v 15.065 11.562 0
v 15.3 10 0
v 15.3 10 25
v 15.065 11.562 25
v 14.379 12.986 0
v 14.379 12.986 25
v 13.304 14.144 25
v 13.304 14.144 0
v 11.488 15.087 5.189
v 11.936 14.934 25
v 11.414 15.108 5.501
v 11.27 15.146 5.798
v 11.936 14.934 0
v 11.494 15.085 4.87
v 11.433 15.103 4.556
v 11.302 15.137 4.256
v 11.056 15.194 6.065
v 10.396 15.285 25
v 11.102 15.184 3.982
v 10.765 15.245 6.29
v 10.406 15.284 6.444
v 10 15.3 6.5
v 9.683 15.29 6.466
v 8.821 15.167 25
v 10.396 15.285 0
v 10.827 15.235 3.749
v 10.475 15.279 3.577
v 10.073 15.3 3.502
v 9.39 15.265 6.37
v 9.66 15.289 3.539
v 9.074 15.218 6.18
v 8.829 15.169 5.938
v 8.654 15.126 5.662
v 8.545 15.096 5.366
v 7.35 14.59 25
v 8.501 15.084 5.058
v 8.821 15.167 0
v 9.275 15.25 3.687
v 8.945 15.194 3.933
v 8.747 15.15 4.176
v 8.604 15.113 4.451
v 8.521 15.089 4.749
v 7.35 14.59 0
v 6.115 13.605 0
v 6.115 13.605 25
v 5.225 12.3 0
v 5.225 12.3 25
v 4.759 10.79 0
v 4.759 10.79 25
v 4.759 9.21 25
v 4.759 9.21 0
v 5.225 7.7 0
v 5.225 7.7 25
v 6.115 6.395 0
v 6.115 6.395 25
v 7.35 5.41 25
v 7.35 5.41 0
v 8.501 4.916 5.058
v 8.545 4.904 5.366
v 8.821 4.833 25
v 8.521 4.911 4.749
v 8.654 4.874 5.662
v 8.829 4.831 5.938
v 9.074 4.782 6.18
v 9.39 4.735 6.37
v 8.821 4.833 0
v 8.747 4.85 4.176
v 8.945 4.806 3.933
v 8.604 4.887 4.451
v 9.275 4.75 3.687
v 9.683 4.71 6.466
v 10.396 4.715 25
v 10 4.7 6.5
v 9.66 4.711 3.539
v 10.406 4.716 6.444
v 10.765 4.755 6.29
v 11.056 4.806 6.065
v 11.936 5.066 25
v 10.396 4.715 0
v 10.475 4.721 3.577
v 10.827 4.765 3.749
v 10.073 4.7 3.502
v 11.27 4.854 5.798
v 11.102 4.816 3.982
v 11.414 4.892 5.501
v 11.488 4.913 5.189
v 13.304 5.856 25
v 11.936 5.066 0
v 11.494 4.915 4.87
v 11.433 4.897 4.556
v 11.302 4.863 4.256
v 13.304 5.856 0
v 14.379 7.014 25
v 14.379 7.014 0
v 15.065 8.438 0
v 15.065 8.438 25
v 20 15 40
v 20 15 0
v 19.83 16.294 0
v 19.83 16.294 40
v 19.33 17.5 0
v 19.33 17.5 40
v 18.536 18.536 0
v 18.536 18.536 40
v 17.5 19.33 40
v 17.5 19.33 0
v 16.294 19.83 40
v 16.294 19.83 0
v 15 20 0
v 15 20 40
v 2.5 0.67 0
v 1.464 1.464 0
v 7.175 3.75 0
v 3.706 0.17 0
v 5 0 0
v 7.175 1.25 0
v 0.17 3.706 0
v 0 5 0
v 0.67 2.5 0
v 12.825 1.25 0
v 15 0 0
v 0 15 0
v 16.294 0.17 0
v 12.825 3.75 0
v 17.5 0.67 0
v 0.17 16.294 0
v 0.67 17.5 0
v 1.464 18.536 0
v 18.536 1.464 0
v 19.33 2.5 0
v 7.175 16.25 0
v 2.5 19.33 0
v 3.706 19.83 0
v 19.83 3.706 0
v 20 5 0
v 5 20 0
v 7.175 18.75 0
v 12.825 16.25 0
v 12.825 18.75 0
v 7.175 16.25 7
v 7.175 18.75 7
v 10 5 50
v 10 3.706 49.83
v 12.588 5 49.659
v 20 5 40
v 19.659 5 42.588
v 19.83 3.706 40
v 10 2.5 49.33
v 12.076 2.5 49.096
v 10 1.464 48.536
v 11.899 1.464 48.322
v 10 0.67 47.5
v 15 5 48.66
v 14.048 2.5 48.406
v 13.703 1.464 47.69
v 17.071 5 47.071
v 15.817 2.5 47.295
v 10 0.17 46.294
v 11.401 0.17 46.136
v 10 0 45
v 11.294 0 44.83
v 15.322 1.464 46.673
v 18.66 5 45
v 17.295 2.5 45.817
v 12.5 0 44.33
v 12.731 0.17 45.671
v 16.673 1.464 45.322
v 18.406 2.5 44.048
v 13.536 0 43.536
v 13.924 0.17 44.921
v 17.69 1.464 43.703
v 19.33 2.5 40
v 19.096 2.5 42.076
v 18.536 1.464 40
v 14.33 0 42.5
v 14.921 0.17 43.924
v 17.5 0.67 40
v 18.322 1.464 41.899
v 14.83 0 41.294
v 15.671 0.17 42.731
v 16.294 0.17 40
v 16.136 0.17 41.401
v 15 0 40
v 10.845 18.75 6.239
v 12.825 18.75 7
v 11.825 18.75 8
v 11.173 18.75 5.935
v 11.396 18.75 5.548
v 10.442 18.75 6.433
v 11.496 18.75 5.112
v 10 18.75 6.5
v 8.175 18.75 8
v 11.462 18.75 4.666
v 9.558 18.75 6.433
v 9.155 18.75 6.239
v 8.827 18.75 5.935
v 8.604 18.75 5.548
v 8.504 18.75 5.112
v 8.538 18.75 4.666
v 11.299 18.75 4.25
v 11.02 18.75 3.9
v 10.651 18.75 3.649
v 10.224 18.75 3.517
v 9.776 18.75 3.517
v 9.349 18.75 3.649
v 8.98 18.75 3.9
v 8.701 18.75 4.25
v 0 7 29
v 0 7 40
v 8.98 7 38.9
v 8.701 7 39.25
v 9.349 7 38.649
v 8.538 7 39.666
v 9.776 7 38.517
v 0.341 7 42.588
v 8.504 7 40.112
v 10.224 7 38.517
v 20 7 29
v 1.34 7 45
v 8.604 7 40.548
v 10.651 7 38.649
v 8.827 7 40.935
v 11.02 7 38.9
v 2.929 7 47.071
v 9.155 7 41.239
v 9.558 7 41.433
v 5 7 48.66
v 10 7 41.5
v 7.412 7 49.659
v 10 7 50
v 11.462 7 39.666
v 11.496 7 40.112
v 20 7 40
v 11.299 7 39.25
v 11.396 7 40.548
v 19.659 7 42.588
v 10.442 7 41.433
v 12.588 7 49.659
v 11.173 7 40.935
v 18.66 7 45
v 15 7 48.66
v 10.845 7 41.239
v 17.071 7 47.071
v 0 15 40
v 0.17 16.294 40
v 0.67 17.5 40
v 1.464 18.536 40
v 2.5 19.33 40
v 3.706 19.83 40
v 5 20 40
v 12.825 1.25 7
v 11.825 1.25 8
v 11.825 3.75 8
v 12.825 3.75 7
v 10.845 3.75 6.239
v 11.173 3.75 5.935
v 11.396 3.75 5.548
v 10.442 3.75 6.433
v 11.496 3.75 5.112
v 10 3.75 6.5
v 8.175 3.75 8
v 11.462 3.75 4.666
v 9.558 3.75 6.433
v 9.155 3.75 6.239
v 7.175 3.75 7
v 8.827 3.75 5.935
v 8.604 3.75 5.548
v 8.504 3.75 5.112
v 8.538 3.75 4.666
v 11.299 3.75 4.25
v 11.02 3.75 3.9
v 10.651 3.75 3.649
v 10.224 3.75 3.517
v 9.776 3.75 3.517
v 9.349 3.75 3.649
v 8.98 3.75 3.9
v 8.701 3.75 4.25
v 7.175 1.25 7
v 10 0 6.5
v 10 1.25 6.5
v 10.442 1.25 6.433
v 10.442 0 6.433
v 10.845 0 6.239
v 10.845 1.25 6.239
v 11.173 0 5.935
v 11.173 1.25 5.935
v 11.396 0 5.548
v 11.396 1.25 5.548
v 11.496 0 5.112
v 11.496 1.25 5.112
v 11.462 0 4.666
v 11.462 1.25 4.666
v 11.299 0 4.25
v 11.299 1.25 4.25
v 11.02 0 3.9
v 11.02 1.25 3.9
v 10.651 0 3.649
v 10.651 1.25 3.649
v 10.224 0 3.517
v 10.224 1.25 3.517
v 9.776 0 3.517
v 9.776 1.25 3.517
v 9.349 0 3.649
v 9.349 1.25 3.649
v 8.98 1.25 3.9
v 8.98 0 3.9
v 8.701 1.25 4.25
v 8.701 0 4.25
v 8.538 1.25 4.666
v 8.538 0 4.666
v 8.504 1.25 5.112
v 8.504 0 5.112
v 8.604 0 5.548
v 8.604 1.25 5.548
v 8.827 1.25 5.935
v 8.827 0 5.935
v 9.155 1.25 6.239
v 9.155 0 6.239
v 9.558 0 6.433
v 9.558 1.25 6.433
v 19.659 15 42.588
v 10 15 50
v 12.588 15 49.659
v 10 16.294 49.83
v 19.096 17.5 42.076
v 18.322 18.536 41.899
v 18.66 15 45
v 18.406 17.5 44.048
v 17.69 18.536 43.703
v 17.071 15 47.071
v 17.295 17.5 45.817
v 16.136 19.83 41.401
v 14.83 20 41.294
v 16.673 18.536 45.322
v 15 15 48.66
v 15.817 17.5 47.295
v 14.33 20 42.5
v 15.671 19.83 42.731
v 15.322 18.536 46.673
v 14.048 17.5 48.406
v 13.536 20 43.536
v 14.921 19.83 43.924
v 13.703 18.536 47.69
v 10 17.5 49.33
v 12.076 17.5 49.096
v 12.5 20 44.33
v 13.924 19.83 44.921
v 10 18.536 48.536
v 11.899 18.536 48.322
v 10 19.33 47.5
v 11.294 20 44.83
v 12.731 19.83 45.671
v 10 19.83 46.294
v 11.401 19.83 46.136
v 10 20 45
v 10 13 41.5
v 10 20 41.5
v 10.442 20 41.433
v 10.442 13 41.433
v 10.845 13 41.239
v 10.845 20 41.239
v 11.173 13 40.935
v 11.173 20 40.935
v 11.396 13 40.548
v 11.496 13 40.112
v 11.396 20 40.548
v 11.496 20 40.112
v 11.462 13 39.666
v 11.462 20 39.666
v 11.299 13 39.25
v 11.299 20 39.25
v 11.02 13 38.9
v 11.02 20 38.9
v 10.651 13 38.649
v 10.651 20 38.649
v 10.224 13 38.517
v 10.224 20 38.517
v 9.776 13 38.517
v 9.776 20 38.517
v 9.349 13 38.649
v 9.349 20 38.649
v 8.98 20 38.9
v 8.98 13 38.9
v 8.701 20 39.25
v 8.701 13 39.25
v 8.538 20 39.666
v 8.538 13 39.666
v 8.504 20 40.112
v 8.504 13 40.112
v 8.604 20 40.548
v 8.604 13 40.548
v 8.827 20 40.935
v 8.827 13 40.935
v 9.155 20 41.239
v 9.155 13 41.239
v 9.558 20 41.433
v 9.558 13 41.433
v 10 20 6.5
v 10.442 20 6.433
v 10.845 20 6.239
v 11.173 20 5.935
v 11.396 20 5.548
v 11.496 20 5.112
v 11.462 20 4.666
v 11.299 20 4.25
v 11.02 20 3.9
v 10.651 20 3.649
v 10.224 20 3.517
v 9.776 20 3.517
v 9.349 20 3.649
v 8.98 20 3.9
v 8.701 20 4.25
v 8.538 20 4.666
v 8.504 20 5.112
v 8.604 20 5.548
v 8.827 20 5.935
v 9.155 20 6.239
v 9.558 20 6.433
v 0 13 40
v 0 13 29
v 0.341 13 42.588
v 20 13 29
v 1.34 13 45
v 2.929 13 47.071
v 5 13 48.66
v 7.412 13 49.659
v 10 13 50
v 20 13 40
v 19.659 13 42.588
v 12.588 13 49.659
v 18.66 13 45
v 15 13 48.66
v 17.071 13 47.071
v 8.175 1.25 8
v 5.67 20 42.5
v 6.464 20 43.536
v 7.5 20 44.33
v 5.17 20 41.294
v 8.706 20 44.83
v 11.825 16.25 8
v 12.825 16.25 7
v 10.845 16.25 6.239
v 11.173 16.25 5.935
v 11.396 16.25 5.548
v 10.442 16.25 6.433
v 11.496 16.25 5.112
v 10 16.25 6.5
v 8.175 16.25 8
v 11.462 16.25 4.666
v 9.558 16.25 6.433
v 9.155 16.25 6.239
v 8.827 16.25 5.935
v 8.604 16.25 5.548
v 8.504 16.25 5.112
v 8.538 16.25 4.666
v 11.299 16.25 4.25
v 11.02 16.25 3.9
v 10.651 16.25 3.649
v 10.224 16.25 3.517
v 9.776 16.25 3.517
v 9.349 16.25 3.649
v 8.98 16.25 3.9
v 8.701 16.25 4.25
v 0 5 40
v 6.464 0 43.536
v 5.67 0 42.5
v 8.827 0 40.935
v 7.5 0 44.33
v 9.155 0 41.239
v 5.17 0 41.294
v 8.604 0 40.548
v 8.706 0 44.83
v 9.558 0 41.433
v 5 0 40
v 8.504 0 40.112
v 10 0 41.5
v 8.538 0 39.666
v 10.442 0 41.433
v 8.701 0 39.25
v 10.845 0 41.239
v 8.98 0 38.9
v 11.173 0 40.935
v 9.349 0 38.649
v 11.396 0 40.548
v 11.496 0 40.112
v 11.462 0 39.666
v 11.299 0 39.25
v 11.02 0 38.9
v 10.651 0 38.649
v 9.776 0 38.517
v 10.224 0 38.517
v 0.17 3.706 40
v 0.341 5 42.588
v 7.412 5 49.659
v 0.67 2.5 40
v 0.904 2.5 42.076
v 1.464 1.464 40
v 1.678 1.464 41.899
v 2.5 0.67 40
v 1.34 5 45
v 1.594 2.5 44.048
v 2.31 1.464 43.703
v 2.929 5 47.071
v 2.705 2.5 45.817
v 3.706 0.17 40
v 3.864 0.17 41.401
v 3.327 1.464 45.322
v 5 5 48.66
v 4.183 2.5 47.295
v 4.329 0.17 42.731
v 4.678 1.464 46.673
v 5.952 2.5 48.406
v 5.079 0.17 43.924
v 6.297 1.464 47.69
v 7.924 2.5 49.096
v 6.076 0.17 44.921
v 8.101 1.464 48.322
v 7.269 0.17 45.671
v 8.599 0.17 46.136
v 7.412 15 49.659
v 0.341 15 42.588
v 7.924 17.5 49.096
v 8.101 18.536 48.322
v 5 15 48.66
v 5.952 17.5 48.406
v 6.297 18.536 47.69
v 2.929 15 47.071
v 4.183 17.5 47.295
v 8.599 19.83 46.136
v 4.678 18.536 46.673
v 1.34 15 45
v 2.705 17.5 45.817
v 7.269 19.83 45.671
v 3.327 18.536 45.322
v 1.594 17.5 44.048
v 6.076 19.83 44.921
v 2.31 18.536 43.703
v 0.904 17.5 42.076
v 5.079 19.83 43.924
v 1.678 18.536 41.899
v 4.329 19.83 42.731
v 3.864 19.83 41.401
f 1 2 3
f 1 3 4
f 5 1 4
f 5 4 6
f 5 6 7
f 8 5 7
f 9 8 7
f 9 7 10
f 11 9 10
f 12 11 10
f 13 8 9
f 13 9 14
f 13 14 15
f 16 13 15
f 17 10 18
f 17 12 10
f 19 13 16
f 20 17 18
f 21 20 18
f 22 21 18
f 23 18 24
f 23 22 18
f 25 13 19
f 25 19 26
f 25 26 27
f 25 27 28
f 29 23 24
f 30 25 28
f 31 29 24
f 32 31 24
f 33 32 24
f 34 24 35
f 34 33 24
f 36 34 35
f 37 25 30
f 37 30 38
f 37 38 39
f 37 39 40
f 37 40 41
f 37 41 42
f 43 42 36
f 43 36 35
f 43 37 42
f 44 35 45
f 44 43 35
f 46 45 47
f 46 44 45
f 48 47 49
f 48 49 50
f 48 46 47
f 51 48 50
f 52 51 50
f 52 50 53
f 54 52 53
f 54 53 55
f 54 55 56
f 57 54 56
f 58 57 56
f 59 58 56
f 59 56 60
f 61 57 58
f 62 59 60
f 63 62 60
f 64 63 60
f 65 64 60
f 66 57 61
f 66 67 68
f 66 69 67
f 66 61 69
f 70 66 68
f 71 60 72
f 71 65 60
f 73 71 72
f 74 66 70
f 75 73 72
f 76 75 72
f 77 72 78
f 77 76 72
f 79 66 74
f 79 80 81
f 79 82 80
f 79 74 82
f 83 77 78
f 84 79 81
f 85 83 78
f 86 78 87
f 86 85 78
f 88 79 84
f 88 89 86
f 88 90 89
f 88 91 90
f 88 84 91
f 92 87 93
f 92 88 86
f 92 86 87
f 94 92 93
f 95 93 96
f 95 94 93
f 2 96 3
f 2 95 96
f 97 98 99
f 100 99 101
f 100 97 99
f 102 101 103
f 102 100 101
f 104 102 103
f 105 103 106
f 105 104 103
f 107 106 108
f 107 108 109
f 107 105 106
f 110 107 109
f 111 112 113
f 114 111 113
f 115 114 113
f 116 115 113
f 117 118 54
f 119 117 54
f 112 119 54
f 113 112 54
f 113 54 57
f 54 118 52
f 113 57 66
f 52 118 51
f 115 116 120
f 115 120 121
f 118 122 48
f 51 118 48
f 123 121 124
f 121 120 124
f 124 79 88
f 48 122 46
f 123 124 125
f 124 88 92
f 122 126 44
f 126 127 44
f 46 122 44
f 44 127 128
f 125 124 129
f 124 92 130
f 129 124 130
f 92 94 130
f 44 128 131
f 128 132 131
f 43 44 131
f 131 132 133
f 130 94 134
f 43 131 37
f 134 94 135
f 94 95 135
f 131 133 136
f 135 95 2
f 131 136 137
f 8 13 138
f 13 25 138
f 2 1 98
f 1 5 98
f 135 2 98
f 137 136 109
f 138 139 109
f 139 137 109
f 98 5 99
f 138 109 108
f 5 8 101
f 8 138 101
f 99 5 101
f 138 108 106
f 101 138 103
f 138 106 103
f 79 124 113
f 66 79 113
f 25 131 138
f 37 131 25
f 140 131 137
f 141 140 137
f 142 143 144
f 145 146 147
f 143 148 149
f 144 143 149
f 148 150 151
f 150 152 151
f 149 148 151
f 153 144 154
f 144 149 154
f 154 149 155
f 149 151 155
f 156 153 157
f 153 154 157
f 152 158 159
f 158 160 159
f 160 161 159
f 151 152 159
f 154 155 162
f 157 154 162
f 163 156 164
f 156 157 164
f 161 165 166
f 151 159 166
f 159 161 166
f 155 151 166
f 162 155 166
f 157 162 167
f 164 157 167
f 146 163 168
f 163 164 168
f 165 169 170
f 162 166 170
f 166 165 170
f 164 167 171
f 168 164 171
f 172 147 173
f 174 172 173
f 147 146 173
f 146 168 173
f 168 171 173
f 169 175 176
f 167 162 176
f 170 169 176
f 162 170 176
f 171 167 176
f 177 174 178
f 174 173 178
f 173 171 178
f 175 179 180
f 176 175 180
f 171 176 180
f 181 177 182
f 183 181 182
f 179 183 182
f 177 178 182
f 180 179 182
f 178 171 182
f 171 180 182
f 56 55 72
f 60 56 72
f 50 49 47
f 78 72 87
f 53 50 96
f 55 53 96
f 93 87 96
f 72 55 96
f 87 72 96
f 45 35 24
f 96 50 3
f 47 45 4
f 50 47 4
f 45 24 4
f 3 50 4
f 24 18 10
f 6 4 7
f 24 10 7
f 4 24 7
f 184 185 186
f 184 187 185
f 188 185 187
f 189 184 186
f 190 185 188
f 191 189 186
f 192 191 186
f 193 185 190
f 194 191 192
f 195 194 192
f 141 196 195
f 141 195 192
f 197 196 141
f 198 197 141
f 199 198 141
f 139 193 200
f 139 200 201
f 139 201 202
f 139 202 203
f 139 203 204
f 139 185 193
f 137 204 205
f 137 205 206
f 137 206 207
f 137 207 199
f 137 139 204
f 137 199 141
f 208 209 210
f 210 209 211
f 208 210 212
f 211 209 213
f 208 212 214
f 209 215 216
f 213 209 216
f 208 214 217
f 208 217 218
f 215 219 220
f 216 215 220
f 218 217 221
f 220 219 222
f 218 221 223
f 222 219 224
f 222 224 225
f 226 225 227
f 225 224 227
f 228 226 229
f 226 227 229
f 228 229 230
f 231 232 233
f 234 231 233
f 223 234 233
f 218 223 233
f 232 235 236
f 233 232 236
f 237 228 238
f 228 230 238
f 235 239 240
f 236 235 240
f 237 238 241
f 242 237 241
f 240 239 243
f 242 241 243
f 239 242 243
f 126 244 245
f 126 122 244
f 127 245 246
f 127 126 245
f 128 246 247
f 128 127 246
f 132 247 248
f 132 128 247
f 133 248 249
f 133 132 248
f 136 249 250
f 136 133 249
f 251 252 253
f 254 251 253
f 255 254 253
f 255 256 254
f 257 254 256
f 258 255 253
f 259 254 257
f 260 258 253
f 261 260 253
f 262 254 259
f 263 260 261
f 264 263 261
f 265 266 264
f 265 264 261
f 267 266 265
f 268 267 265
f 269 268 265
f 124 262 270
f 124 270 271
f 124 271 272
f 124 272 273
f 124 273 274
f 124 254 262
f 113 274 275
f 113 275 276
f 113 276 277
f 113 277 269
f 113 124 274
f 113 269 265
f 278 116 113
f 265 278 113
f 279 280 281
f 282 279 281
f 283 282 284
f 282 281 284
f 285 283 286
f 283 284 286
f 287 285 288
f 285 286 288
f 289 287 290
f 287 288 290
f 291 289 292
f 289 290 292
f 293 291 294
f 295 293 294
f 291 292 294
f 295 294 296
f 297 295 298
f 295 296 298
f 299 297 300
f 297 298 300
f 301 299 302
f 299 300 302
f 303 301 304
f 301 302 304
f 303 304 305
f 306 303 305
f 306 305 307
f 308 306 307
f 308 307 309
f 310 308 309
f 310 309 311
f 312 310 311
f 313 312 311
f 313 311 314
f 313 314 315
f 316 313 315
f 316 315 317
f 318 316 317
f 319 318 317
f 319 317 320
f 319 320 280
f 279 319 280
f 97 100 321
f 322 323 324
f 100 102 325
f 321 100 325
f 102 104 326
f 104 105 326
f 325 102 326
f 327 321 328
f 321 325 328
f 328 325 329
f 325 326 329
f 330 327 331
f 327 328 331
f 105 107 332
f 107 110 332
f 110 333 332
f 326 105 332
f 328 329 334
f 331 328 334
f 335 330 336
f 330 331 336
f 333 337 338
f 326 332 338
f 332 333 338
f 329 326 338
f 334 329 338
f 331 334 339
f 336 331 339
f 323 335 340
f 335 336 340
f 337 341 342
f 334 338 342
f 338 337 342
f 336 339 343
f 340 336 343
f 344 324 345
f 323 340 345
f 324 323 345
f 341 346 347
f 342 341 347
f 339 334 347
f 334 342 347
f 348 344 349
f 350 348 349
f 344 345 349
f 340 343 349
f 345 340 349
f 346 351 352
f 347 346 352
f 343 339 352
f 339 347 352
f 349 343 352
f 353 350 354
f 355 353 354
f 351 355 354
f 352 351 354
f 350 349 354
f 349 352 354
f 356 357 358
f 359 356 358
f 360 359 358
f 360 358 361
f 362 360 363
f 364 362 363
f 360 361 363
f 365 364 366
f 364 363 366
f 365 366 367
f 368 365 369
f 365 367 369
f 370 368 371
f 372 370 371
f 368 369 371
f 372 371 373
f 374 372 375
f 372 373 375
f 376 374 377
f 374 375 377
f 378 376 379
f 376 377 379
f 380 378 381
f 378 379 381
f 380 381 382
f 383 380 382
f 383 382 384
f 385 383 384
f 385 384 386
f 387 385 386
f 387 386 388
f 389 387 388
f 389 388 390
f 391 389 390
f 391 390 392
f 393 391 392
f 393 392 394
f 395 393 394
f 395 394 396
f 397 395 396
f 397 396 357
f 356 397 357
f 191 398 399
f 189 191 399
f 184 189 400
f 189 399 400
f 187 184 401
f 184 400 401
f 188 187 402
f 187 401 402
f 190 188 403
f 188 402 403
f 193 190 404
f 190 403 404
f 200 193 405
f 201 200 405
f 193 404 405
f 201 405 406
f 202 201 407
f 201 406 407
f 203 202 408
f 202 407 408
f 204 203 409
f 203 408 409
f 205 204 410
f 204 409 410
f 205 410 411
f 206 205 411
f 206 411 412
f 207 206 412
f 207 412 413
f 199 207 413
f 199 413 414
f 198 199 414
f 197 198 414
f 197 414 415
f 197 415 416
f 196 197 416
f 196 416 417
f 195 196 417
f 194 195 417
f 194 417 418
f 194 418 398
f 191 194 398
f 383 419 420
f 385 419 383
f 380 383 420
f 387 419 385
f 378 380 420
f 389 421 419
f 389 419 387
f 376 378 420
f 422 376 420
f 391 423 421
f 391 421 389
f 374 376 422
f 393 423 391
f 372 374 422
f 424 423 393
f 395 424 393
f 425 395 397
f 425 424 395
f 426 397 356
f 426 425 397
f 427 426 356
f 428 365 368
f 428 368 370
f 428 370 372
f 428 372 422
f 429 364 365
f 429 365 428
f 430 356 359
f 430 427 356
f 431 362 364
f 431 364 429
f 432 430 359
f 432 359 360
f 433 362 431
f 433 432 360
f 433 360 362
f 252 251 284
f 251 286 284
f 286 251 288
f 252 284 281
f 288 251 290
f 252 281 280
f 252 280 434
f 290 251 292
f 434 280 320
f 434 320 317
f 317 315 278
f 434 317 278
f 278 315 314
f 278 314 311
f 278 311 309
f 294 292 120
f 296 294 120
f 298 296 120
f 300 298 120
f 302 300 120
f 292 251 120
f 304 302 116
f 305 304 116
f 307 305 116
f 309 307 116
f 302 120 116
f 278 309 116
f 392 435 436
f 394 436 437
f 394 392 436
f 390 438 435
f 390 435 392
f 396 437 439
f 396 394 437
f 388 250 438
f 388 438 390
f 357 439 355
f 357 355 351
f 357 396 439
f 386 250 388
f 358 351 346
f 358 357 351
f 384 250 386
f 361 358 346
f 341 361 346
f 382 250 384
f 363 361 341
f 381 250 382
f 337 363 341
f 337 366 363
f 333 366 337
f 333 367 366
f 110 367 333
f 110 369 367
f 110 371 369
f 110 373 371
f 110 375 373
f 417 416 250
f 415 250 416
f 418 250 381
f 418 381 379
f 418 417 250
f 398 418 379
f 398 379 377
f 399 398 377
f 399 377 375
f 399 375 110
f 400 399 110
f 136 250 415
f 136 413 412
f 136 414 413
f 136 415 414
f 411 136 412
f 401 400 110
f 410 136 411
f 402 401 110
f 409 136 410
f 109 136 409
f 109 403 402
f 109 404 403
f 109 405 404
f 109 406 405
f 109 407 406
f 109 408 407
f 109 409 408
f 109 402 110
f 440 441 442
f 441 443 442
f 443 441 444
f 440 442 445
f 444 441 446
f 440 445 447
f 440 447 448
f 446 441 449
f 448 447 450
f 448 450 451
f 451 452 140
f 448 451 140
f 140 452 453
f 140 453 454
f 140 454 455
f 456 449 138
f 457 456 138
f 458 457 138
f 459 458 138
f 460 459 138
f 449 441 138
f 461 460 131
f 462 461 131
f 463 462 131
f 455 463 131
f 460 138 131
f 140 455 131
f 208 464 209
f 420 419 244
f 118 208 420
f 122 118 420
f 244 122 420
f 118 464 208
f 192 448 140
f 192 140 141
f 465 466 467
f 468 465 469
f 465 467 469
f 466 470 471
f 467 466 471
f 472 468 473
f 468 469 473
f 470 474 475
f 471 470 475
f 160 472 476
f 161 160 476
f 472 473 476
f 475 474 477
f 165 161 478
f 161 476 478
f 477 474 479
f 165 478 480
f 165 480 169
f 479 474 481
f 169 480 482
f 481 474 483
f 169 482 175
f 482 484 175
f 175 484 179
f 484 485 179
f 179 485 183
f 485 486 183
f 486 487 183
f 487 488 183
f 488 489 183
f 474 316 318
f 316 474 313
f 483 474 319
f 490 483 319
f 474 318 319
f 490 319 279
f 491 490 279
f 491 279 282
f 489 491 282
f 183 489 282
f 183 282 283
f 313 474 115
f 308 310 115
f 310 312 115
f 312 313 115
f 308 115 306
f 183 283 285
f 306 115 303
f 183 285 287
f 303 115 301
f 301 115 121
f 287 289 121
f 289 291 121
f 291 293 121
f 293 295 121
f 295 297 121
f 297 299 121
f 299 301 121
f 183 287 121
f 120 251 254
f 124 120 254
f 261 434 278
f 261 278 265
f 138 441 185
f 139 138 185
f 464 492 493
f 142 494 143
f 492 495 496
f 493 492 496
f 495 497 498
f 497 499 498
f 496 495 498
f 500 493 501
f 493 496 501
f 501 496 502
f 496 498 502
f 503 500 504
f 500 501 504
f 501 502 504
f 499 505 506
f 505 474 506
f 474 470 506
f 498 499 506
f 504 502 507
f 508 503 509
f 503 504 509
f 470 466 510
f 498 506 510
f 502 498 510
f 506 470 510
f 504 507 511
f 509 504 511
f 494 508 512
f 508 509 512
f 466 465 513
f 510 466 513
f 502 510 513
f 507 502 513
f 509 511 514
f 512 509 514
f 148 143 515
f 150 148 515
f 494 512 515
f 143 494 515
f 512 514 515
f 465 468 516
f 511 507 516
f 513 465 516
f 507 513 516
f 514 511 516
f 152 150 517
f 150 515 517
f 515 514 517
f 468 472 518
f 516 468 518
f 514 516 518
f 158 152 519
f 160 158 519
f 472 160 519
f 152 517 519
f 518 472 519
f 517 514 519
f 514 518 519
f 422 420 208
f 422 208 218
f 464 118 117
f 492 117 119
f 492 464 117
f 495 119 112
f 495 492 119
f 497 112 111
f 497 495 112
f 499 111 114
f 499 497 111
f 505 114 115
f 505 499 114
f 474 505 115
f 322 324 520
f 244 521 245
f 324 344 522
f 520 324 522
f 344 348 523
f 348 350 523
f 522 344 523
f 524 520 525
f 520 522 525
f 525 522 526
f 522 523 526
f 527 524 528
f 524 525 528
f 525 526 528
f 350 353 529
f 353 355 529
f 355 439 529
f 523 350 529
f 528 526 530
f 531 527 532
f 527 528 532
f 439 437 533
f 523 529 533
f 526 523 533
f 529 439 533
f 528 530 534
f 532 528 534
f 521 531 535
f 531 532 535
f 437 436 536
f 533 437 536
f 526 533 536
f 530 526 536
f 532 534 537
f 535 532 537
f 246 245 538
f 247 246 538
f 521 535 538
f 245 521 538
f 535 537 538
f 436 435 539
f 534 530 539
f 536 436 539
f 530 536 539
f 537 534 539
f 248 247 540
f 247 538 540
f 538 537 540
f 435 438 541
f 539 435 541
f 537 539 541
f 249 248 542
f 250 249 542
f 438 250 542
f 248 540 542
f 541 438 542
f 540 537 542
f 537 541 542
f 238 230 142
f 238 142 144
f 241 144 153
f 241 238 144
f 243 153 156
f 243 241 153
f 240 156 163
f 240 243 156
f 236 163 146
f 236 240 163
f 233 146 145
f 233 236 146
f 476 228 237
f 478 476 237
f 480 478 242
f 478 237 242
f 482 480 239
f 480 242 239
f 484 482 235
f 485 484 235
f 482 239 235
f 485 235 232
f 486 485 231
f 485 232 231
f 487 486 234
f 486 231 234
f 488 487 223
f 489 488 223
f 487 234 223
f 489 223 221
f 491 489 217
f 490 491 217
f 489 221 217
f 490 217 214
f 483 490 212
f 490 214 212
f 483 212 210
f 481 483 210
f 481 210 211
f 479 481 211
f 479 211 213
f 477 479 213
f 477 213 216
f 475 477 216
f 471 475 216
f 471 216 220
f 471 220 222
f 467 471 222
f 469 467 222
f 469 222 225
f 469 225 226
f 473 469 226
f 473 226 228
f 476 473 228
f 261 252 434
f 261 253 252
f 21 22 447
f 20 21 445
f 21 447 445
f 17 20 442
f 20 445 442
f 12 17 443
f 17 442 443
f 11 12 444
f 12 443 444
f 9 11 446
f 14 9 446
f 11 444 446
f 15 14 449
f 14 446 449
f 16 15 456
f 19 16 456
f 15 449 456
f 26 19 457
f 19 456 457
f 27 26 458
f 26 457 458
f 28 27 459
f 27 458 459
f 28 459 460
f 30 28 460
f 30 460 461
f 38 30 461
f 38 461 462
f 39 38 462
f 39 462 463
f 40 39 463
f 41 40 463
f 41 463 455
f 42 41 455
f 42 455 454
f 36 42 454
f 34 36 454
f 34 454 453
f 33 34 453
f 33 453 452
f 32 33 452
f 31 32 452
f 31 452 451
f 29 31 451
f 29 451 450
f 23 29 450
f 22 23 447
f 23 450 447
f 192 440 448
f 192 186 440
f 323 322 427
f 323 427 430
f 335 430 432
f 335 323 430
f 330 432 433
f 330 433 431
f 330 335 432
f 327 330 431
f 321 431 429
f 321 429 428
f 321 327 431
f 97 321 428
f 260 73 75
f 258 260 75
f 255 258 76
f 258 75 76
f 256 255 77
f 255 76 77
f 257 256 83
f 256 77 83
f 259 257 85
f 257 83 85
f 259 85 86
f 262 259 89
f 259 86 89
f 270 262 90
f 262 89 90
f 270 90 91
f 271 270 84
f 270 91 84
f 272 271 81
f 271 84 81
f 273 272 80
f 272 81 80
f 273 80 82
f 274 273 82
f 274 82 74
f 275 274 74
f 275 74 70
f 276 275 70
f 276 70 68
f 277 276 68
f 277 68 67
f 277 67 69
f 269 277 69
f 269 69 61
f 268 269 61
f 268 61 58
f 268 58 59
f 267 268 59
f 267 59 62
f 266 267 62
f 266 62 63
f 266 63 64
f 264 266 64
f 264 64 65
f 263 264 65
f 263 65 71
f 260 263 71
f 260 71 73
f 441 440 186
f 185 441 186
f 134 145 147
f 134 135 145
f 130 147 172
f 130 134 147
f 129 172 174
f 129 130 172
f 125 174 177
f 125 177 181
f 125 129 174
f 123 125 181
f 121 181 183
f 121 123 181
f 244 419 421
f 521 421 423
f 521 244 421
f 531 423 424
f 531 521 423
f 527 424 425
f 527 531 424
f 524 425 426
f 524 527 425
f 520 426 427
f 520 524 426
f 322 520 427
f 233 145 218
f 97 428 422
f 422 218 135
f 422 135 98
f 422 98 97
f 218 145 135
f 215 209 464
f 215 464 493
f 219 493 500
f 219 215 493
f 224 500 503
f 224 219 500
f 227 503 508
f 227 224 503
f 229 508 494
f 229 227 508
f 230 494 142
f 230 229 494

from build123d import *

# Parameters (mm, degrees)
SKETCH1_W           = 20
SKETCH1_H           = 20
SKETCH1_R           = 5.3
BOSS_EXTRUDE1_DEPTH = 25
SKETCH2_W           = 20
SKETCH2_H           = 20
BOSS_EXTRUDE2_DEPTH = 25
SKETCH4_W           = 20
SKETCH4_H           = 6
CUT_EXTRUDE1_DEPTH  = 21
CUT_EXTRUDE2_REACH  = 59.446
SKETCH5_R           = 1.5
FILLET2_R           = 10
FILLET3_R           = 5
SKETCH6_W           = 5.65
SKETCH6_H           = 2.5
CUT_EXTRUDE3_DEPTH  = 8
CHAMFER1_SIZE       = 1


with BuildPart() as part:
    # Sketch1 → Boss-Extrude1 (new body)
    with BuildSketch(Plane.XY):
        with Locations((10, 10)):
            Rectangle(SKETCH1_W, SKETCH1_H)
        with Locations((10, 10)):
            Circle(SKETCH1_R, mode=Mode.SUBTRACT)
    extrude(amount=BOSS_EXTRUDE1_DEPTH)

    # Sketch2 → Boss-Extrude2 (add)
    with BuildSketch(Plane.XY.offset(25)):
        with Locations((10, 10)):
            Rectangle(SKETCH2_W, SKETCH2_H)
    extrude(amount=BOSS_EXTRUDE2_DEPTH)

    # Sketch4 → Cut-Extrude1 (cut)
    with BuildSketch(Plane.XY.offset(50)):
        with Locations((10, 10)):
            Rectangle(SKETCH4_W, SKETCH4_H)
    extrude(amount=-CUT_EXTRUDE1_DEPTH, mode=Mode.SUBTRACT)

    # Cut-Extrude2: up to this face of the body (flat: up to its plane)
    cut_extrude2_end = Plane(part.part.faces().sort_by_distance((10, 0, 25))[0])
    # Sketch5 → Cut-Extrude2 (cut, up to the picked face)
    with BuildSketch(Plane(origin=(0, 20, 0), x_dir=(1, 0, 0), z_dir=(0, 1, 0)), mode=Mode.PRIVATE) as cut_extrude2_sk1:
        with Locations(Location((10, -5, 0), (0, 0, 270))):
            Circle(SKETCH5_R)
    cut_extrude2_tool1 = split(extrude(cut_extrude2_sk1.sketch, amount=-CUT_EXTRUDE2_REACH, mode=Mode.PRIVATE), bisect_by=cut_extrude2_end, keep=Keep.BOTH, mode=Mode.PRIVATE)
    # Sketch5 → Cut-Extrude2 (cut, up to the picked face)
    with BuildSketch(Plane(origin=(0, 20, 0), x_dir=(1, 0, 0), z_dir=(0, 1, 0)), mode=Mode.PRIVATE) as cut_extrude2_sk2:
        with Locations(Location((10, -40, 0), (0, 0, 270))):
            Circle(SKETCH5_R)
    cut_extrude2_tool2 = split(extrude(cut_extrude2_sk2.sketch, amount=-CUT_EXTRUDE2_REACH, mode=Mode.PRIVATE), bisect_by=cut_extrude2_end, keep=Keep.BOTH, mode=Mode.PRIVATE)
    add(cut_extrude2_tool1.solids().sort_by(Axis((10, 20, 5), (0, -1, 0)))[0], mode=Mode.SUBTRACT)
    add(cut_extrude2_tool2.solids().sort_by(Axis((10, 20, 40), (0, -1, 0)))[0], mode=Mode.SUBTRACT)

    # Fillet2
    fillet2_edges = [part.edges().sort_by_distance(p)[0] for p in [
        (0, 16.5, 50),
        (0, 3.5, 50),
        (20, 3.5, 50),
        (20, 16.5, 50),
    ]]
    fillet(fillet2_edges, radius=FILLET2_R - 0.0001)  # a hair under: the kernel refuses the full size

    # Fillet3
    fillet3_edges = [part.edges().sort_by_distance(p)[0] for p in [
        (0, 20, 20.00005),
        (0, 0, 20.00005),
        (20, 20, 20.00005),
        (17.071097101, 20, 47.071097101),
        (2.928902899, 20, 47.071097101),
        (20, 0, 20.00005),
        (17.071097101, 0, 47.071097101),
        (2.928902899, 0, 47.071097101),
    ]]
    fillet(fillet3_edges, radius=FILLET3_R)

    # Sketch6 → Cut-Extrude3 (cut)
    with BuildSketch(Plane(origin=(0, 0, 0), x_dir=(-1, 0, 0), z_dir=(0, 0, -1))):
        with Locations((-10, 17.5)):
            Rectangle(SKETCH6_W, SKETCH6_H)
        with Locations((-10, 2.5)):
            Rectangle(SKETCH6_W, SKETCH6_H)
    extrude(amount=-CUT_EXTRUDE3_DEPTH, mode=Mode.SUBTRACT)

    # Chamfer1
    chamfer1_edges = [part.edges().sort_by_distance(p)[0] for p in [
        (12.825, 17.5, 8),
        (7.175, 17.5, 8),
        (12.825, 2.5, 8),
        (7.175, 2.5, 8),
    ]]
    chamfer(chamfer1_edges, length=CHAMFER1_SIZE)


solid = part.part
